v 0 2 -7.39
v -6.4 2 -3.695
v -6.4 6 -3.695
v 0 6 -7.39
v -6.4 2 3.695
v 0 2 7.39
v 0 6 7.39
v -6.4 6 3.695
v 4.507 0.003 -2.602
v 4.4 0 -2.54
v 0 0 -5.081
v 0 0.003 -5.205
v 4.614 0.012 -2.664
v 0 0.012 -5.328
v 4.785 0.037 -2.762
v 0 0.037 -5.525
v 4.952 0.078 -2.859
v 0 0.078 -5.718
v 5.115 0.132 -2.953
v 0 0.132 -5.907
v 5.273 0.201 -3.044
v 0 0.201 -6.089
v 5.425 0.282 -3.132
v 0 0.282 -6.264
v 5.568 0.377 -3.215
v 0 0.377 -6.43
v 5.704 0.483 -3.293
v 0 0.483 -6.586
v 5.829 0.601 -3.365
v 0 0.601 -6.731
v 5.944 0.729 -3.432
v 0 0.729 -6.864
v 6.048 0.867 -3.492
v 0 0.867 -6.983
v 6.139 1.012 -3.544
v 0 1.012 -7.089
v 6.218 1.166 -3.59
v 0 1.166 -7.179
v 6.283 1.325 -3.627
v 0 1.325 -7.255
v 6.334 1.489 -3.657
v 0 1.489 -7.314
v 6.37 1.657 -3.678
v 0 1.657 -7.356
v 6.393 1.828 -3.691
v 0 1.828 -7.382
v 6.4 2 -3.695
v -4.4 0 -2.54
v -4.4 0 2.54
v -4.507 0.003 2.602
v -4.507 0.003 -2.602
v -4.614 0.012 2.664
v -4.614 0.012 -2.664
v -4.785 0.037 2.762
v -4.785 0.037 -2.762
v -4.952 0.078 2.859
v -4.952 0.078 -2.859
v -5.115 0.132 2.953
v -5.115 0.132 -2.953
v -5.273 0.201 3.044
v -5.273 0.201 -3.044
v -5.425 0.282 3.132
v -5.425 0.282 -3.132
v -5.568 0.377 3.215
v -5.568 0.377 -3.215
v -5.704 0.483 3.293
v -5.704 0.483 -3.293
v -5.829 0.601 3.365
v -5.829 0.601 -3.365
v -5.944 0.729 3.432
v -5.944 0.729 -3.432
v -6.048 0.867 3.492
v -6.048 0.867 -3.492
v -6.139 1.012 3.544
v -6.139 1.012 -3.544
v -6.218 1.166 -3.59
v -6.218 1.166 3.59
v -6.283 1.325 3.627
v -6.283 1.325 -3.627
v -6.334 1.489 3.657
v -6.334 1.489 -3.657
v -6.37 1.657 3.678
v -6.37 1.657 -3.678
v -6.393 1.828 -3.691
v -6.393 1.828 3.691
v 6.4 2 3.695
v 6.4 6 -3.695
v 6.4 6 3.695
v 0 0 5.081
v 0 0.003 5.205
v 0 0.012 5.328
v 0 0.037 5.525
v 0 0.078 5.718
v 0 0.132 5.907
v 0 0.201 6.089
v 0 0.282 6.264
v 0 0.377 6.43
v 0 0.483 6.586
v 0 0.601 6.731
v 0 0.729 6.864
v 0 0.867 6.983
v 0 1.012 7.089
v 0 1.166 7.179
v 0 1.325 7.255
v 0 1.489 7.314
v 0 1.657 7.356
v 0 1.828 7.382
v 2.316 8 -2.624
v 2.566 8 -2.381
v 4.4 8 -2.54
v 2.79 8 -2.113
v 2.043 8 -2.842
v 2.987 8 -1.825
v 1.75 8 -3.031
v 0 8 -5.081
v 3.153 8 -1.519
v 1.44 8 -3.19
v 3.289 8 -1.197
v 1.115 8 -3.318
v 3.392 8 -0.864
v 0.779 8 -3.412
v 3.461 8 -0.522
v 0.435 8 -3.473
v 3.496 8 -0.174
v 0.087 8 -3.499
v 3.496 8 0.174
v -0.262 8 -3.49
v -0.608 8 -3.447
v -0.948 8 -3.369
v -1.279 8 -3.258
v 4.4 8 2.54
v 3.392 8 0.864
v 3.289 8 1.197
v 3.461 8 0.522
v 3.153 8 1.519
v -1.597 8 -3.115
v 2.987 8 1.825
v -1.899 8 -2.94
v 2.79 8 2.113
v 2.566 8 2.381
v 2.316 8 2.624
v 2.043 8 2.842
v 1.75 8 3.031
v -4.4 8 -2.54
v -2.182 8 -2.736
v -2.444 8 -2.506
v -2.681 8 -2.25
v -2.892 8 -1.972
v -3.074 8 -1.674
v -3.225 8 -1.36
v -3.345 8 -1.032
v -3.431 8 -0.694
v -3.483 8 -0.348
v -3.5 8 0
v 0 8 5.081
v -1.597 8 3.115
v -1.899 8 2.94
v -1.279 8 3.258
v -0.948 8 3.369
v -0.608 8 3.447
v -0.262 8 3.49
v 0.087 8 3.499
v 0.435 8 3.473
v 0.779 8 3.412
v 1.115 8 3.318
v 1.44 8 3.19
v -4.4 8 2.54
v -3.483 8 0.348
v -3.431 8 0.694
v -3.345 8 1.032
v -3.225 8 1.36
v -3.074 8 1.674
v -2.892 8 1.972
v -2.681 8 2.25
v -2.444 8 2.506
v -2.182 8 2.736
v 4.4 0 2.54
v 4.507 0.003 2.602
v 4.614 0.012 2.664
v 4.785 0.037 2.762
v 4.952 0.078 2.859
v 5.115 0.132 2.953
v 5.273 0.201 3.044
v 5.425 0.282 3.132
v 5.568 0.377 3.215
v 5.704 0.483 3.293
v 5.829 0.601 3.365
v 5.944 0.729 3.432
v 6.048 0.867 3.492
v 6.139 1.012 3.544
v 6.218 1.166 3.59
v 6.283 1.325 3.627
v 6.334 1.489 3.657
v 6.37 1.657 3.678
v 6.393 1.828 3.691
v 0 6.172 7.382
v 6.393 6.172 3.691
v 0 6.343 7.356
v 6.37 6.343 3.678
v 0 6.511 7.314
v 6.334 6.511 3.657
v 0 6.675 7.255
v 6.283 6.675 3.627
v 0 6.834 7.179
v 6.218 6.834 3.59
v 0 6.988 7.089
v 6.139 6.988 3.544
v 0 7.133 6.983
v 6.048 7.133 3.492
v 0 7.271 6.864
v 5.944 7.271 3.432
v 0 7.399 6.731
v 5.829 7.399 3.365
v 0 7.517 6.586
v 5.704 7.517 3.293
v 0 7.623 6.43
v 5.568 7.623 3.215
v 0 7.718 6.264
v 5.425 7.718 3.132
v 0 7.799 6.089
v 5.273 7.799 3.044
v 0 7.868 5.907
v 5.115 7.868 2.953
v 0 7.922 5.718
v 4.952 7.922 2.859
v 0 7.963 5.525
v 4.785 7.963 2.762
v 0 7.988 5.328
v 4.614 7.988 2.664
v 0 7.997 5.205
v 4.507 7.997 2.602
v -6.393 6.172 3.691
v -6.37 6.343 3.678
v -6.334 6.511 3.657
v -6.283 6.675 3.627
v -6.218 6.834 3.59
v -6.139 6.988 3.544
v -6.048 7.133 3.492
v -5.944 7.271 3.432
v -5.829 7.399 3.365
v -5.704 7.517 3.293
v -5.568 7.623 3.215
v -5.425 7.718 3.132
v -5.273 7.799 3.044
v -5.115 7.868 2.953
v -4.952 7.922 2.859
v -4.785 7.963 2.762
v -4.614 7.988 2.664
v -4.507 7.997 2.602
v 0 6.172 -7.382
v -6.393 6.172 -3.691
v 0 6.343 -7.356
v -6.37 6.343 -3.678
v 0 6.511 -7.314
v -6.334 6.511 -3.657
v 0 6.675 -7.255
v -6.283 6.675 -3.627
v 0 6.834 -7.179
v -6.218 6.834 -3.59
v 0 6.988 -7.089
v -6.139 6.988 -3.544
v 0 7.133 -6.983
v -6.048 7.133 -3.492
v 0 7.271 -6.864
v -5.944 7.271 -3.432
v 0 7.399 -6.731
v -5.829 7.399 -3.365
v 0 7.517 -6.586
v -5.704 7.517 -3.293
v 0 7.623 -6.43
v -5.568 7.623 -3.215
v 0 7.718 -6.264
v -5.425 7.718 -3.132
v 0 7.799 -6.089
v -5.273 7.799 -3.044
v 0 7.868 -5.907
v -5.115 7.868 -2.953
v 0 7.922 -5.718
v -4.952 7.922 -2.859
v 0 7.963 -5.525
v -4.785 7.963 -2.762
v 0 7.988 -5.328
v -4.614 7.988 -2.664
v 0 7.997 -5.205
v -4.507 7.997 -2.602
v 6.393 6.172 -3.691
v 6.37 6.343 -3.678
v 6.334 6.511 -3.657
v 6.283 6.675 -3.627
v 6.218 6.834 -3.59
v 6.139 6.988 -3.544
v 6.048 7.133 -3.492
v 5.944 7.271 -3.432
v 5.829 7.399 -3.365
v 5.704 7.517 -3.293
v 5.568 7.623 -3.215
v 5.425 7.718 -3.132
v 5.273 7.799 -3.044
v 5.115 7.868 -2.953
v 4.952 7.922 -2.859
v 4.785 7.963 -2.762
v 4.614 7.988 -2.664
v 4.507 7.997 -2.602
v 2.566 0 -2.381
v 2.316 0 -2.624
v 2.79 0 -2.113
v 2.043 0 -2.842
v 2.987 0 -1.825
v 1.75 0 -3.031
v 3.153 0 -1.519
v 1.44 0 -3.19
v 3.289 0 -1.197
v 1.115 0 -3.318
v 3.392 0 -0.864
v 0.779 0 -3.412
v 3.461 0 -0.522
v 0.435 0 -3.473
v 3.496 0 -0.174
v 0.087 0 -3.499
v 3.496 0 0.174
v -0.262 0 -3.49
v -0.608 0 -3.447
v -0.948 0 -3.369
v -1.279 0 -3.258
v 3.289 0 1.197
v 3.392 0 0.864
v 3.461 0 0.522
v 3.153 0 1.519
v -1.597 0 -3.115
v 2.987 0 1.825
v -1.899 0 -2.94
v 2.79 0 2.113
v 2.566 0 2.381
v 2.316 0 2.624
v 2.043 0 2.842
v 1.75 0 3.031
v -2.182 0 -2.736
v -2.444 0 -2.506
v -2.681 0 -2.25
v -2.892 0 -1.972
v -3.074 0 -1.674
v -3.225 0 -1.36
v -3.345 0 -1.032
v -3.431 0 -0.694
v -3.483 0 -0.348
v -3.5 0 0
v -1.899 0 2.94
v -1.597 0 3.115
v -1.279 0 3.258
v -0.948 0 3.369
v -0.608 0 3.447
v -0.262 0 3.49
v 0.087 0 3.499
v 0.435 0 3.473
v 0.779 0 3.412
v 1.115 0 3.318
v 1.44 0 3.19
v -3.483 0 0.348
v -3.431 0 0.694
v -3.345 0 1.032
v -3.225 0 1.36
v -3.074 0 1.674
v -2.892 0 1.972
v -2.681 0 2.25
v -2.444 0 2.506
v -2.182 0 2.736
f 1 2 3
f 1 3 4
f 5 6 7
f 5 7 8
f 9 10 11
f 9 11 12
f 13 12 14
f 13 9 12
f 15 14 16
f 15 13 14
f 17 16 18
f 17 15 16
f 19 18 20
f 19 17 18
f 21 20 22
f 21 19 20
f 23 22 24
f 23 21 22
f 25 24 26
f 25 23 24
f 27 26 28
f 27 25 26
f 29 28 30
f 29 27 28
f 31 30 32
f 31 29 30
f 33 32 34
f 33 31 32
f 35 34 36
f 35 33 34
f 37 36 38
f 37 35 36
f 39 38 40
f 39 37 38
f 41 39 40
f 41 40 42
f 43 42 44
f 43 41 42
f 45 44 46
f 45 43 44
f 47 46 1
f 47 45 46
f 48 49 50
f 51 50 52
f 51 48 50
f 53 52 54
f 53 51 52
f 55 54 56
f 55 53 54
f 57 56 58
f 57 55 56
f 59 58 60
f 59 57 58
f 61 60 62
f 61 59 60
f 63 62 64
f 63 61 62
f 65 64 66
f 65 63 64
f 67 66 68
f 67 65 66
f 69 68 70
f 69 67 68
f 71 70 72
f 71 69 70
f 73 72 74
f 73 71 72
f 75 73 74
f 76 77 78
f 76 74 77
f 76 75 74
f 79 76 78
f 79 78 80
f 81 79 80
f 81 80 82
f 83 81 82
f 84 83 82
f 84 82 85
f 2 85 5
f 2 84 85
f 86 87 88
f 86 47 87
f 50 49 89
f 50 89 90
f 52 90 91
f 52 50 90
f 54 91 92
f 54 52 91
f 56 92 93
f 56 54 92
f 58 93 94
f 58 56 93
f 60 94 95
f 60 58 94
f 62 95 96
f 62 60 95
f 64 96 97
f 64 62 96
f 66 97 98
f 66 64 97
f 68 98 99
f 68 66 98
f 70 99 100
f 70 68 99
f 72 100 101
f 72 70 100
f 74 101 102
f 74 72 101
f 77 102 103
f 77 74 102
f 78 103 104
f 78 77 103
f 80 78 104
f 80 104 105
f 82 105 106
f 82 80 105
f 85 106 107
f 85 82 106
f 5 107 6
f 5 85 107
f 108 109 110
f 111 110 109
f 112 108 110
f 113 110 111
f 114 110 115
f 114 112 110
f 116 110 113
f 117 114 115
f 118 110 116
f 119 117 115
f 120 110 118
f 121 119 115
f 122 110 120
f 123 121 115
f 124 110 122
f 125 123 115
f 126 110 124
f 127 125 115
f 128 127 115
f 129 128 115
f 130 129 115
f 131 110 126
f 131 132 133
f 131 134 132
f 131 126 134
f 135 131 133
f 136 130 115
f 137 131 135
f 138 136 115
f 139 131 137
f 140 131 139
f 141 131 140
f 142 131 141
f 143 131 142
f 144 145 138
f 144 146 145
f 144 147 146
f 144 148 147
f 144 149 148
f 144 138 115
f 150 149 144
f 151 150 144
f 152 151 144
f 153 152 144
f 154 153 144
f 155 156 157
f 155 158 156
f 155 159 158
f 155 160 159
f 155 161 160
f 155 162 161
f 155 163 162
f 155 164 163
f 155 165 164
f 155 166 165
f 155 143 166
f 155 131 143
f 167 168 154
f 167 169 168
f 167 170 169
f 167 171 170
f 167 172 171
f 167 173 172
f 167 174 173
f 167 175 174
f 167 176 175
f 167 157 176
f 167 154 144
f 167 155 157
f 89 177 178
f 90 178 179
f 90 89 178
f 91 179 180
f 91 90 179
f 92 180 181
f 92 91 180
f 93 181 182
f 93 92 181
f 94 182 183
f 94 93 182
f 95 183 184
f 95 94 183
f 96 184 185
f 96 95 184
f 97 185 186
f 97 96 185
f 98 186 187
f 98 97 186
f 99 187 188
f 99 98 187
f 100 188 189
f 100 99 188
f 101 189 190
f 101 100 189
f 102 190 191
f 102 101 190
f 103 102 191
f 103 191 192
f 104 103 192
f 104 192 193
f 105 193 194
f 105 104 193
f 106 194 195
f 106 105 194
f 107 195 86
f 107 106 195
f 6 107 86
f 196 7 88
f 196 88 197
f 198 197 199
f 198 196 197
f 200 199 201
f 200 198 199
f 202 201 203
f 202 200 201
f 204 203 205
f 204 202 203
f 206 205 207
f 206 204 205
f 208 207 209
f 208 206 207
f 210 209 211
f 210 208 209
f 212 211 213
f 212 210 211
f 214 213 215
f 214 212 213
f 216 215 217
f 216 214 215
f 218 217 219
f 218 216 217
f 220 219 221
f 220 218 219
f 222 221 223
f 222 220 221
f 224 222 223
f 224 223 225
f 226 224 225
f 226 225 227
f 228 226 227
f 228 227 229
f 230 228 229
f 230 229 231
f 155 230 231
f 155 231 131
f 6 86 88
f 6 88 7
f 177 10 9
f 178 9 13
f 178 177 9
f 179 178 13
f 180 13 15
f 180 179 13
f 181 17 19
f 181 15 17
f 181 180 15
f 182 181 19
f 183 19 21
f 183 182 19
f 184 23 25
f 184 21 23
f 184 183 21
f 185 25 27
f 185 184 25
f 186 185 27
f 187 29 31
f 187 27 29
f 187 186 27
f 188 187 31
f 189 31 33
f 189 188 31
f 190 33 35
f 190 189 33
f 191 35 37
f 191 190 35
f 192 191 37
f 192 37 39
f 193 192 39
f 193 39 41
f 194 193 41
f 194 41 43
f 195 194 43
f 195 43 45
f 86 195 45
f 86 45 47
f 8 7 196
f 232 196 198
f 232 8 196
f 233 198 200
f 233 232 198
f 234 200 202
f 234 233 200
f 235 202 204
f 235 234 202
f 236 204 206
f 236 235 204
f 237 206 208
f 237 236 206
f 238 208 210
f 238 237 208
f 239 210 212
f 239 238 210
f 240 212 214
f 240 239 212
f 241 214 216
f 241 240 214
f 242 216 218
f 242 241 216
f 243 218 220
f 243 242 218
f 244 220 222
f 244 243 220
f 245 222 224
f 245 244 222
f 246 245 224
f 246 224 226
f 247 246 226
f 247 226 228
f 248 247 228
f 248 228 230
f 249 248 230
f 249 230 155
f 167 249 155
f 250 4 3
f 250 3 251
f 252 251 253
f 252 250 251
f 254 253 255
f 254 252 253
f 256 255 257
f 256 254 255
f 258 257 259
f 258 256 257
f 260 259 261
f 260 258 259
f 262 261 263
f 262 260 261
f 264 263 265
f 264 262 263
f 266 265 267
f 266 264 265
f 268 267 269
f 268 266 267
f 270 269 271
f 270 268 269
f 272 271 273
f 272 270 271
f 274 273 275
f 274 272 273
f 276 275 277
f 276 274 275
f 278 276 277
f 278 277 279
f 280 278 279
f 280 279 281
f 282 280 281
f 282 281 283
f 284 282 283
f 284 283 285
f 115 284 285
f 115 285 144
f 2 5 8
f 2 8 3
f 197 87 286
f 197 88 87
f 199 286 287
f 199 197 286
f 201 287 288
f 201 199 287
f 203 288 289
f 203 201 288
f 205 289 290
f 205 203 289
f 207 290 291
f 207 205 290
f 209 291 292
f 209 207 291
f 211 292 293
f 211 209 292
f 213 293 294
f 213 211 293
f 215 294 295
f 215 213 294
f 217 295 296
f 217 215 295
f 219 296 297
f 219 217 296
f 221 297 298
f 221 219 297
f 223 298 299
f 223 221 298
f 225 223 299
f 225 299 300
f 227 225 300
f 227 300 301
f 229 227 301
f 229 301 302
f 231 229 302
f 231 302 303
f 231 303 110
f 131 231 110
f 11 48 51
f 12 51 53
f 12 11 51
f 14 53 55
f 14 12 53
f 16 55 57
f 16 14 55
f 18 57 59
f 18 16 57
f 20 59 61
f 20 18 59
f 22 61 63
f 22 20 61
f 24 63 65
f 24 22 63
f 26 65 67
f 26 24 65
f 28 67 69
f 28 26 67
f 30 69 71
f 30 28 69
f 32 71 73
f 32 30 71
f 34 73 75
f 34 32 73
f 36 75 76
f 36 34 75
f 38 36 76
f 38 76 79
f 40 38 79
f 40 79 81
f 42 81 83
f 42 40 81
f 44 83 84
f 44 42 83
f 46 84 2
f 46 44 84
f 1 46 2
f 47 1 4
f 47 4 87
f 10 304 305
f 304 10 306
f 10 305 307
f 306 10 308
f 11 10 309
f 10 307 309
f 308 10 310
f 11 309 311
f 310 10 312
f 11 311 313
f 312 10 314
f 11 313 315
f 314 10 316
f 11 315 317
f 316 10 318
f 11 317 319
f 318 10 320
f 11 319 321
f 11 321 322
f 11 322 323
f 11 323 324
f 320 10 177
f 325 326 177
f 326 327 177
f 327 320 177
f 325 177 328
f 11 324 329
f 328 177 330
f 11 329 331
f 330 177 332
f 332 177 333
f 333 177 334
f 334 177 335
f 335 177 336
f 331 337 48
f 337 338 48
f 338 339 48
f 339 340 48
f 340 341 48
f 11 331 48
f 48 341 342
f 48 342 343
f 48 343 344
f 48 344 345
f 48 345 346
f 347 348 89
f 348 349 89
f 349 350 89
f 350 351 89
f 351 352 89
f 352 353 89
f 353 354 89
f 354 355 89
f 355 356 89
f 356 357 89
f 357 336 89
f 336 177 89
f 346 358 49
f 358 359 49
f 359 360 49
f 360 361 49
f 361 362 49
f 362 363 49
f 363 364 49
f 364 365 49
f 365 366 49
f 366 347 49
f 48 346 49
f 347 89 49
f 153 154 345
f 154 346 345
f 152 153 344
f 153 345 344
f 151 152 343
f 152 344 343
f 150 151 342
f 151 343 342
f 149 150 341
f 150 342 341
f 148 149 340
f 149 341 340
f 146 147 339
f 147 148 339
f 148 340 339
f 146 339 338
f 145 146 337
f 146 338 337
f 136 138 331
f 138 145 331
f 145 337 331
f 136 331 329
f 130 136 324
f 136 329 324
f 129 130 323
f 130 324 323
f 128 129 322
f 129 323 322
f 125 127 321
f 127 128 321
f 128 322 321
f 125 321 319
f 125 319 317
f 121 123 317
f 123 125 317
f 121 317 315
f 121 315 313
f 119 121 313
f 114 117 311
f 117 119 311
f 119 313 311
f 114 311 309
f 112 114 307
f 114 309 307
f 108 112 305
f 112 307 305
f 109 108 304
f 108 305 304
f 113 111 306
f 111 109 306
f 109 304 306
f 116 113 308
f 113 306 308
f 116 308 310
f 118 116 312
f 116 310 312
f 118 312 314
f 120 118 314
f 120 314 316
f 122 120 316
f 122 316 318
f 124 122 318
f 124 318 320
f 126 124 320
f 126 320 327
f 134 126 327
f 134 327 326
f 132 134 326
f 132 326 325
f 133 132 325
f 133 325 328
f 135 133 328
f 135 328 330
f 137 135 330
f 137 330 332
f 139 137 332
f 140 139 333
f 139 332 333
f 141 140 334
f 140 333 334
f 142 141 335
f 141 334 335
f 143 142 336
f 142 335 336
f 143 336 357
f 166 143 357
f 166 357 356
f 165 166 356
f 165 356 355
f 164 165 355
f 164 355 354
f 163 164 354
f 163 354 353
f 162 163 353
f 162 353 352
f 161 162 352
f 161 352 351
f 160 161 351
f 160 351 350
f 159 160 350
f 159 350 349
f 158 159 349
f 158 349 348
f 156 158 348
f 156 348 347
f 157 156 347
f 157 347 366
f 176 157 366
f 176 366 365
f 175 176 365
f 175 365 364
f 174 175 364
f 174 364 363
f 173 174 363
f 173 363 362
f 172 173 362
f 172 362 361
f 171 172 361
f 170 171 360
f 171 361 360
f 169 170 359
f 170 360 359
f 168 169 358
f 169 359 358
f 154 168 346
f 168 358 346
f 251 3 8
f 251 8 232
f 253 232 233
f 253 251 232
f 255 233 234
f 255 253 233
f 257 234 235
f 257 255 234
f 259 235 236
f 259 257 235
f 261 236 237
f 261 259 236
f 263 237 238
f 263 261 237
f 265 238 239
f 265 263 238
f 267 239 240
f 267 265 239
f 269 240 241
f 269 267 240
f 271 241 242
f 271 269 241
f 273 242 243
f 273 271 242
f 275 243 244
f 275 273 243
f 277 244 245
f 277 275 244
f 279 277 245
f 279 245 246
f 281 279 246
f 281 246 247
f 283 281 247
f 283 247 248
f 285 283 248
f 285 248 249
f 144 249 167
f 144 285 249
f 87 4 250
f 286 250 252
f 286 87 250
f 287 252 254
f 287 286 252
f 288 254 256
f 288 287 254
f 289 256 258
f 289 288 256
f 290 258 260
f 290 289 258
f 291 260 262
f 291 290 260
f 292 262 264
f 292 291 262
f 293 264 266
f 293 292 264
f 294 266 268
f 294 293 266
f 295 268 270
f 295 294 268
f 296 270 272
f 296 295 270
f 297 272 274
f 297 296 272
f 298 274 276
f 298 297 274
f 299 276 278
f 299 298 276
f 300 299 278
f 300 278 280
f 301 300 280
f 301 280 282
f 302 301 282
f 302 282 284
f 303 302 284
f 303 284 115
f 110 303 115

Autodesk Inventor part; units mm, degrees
ref_plane "YZ Plane" through (0, 0, 0) normal (1, 0, 0) x (0, 1, 0)
ref_plane "XZ Plane" through (0, 0, 0) normal (0, 1, 0) x (-1, 0, 0)
ref_plane "XY Plane" through (0, 0, 0) normal (0, 0, 1) x (1, 0, 0)
sketch "Boceto1" plane through (0, 0, 0) normal (0, 1, 0) x (-1, 0, 0)
  line L0 (0, -7.3901) -> (-6.4, -3.695)
  line L1 (-6.4, -3.695) -> (-6.4, 3.695)
  line L2 (-6.4, 3.695) -> (0, 7.3901)
  line L3 (0, 7.3901) -> (6.4, 3.695)
  line L4 (6.4, 3.695) -> (6.4, -3.695)
  line L5 (6.4, -3.695) -> (0, -7.3901)
  circle A0 centre (0, 0) radius 3.5
  dimension "d0" = 6.4
  dimension "d1" = 0
  dimension "d2" = 7
extrude "Extrusión1" add sketch "Boceto1" along normal blind 8
fillet "Empalme1" radius 2 12 edges at (3.2, 8, 5.5426) (-3.2, 8, 5.5426) (-3.2, 8, -5.5426) (3.2, 8, -5.5426) (6.4, 8, 0) (-6.4, 8, 0) (3.2, 0, 5.5426) (6.4, 0, 0) (-3.2, 0, 5.5426) (3.2, 0, -5.5426) (-3.2, 0, -5.5426) (-6.4, 0, 0)
thread "Rosca1" size "M7x1" class "6H" standard "ANSI Metric M Profile" full length
properties part number "BASE_TUERCA"
